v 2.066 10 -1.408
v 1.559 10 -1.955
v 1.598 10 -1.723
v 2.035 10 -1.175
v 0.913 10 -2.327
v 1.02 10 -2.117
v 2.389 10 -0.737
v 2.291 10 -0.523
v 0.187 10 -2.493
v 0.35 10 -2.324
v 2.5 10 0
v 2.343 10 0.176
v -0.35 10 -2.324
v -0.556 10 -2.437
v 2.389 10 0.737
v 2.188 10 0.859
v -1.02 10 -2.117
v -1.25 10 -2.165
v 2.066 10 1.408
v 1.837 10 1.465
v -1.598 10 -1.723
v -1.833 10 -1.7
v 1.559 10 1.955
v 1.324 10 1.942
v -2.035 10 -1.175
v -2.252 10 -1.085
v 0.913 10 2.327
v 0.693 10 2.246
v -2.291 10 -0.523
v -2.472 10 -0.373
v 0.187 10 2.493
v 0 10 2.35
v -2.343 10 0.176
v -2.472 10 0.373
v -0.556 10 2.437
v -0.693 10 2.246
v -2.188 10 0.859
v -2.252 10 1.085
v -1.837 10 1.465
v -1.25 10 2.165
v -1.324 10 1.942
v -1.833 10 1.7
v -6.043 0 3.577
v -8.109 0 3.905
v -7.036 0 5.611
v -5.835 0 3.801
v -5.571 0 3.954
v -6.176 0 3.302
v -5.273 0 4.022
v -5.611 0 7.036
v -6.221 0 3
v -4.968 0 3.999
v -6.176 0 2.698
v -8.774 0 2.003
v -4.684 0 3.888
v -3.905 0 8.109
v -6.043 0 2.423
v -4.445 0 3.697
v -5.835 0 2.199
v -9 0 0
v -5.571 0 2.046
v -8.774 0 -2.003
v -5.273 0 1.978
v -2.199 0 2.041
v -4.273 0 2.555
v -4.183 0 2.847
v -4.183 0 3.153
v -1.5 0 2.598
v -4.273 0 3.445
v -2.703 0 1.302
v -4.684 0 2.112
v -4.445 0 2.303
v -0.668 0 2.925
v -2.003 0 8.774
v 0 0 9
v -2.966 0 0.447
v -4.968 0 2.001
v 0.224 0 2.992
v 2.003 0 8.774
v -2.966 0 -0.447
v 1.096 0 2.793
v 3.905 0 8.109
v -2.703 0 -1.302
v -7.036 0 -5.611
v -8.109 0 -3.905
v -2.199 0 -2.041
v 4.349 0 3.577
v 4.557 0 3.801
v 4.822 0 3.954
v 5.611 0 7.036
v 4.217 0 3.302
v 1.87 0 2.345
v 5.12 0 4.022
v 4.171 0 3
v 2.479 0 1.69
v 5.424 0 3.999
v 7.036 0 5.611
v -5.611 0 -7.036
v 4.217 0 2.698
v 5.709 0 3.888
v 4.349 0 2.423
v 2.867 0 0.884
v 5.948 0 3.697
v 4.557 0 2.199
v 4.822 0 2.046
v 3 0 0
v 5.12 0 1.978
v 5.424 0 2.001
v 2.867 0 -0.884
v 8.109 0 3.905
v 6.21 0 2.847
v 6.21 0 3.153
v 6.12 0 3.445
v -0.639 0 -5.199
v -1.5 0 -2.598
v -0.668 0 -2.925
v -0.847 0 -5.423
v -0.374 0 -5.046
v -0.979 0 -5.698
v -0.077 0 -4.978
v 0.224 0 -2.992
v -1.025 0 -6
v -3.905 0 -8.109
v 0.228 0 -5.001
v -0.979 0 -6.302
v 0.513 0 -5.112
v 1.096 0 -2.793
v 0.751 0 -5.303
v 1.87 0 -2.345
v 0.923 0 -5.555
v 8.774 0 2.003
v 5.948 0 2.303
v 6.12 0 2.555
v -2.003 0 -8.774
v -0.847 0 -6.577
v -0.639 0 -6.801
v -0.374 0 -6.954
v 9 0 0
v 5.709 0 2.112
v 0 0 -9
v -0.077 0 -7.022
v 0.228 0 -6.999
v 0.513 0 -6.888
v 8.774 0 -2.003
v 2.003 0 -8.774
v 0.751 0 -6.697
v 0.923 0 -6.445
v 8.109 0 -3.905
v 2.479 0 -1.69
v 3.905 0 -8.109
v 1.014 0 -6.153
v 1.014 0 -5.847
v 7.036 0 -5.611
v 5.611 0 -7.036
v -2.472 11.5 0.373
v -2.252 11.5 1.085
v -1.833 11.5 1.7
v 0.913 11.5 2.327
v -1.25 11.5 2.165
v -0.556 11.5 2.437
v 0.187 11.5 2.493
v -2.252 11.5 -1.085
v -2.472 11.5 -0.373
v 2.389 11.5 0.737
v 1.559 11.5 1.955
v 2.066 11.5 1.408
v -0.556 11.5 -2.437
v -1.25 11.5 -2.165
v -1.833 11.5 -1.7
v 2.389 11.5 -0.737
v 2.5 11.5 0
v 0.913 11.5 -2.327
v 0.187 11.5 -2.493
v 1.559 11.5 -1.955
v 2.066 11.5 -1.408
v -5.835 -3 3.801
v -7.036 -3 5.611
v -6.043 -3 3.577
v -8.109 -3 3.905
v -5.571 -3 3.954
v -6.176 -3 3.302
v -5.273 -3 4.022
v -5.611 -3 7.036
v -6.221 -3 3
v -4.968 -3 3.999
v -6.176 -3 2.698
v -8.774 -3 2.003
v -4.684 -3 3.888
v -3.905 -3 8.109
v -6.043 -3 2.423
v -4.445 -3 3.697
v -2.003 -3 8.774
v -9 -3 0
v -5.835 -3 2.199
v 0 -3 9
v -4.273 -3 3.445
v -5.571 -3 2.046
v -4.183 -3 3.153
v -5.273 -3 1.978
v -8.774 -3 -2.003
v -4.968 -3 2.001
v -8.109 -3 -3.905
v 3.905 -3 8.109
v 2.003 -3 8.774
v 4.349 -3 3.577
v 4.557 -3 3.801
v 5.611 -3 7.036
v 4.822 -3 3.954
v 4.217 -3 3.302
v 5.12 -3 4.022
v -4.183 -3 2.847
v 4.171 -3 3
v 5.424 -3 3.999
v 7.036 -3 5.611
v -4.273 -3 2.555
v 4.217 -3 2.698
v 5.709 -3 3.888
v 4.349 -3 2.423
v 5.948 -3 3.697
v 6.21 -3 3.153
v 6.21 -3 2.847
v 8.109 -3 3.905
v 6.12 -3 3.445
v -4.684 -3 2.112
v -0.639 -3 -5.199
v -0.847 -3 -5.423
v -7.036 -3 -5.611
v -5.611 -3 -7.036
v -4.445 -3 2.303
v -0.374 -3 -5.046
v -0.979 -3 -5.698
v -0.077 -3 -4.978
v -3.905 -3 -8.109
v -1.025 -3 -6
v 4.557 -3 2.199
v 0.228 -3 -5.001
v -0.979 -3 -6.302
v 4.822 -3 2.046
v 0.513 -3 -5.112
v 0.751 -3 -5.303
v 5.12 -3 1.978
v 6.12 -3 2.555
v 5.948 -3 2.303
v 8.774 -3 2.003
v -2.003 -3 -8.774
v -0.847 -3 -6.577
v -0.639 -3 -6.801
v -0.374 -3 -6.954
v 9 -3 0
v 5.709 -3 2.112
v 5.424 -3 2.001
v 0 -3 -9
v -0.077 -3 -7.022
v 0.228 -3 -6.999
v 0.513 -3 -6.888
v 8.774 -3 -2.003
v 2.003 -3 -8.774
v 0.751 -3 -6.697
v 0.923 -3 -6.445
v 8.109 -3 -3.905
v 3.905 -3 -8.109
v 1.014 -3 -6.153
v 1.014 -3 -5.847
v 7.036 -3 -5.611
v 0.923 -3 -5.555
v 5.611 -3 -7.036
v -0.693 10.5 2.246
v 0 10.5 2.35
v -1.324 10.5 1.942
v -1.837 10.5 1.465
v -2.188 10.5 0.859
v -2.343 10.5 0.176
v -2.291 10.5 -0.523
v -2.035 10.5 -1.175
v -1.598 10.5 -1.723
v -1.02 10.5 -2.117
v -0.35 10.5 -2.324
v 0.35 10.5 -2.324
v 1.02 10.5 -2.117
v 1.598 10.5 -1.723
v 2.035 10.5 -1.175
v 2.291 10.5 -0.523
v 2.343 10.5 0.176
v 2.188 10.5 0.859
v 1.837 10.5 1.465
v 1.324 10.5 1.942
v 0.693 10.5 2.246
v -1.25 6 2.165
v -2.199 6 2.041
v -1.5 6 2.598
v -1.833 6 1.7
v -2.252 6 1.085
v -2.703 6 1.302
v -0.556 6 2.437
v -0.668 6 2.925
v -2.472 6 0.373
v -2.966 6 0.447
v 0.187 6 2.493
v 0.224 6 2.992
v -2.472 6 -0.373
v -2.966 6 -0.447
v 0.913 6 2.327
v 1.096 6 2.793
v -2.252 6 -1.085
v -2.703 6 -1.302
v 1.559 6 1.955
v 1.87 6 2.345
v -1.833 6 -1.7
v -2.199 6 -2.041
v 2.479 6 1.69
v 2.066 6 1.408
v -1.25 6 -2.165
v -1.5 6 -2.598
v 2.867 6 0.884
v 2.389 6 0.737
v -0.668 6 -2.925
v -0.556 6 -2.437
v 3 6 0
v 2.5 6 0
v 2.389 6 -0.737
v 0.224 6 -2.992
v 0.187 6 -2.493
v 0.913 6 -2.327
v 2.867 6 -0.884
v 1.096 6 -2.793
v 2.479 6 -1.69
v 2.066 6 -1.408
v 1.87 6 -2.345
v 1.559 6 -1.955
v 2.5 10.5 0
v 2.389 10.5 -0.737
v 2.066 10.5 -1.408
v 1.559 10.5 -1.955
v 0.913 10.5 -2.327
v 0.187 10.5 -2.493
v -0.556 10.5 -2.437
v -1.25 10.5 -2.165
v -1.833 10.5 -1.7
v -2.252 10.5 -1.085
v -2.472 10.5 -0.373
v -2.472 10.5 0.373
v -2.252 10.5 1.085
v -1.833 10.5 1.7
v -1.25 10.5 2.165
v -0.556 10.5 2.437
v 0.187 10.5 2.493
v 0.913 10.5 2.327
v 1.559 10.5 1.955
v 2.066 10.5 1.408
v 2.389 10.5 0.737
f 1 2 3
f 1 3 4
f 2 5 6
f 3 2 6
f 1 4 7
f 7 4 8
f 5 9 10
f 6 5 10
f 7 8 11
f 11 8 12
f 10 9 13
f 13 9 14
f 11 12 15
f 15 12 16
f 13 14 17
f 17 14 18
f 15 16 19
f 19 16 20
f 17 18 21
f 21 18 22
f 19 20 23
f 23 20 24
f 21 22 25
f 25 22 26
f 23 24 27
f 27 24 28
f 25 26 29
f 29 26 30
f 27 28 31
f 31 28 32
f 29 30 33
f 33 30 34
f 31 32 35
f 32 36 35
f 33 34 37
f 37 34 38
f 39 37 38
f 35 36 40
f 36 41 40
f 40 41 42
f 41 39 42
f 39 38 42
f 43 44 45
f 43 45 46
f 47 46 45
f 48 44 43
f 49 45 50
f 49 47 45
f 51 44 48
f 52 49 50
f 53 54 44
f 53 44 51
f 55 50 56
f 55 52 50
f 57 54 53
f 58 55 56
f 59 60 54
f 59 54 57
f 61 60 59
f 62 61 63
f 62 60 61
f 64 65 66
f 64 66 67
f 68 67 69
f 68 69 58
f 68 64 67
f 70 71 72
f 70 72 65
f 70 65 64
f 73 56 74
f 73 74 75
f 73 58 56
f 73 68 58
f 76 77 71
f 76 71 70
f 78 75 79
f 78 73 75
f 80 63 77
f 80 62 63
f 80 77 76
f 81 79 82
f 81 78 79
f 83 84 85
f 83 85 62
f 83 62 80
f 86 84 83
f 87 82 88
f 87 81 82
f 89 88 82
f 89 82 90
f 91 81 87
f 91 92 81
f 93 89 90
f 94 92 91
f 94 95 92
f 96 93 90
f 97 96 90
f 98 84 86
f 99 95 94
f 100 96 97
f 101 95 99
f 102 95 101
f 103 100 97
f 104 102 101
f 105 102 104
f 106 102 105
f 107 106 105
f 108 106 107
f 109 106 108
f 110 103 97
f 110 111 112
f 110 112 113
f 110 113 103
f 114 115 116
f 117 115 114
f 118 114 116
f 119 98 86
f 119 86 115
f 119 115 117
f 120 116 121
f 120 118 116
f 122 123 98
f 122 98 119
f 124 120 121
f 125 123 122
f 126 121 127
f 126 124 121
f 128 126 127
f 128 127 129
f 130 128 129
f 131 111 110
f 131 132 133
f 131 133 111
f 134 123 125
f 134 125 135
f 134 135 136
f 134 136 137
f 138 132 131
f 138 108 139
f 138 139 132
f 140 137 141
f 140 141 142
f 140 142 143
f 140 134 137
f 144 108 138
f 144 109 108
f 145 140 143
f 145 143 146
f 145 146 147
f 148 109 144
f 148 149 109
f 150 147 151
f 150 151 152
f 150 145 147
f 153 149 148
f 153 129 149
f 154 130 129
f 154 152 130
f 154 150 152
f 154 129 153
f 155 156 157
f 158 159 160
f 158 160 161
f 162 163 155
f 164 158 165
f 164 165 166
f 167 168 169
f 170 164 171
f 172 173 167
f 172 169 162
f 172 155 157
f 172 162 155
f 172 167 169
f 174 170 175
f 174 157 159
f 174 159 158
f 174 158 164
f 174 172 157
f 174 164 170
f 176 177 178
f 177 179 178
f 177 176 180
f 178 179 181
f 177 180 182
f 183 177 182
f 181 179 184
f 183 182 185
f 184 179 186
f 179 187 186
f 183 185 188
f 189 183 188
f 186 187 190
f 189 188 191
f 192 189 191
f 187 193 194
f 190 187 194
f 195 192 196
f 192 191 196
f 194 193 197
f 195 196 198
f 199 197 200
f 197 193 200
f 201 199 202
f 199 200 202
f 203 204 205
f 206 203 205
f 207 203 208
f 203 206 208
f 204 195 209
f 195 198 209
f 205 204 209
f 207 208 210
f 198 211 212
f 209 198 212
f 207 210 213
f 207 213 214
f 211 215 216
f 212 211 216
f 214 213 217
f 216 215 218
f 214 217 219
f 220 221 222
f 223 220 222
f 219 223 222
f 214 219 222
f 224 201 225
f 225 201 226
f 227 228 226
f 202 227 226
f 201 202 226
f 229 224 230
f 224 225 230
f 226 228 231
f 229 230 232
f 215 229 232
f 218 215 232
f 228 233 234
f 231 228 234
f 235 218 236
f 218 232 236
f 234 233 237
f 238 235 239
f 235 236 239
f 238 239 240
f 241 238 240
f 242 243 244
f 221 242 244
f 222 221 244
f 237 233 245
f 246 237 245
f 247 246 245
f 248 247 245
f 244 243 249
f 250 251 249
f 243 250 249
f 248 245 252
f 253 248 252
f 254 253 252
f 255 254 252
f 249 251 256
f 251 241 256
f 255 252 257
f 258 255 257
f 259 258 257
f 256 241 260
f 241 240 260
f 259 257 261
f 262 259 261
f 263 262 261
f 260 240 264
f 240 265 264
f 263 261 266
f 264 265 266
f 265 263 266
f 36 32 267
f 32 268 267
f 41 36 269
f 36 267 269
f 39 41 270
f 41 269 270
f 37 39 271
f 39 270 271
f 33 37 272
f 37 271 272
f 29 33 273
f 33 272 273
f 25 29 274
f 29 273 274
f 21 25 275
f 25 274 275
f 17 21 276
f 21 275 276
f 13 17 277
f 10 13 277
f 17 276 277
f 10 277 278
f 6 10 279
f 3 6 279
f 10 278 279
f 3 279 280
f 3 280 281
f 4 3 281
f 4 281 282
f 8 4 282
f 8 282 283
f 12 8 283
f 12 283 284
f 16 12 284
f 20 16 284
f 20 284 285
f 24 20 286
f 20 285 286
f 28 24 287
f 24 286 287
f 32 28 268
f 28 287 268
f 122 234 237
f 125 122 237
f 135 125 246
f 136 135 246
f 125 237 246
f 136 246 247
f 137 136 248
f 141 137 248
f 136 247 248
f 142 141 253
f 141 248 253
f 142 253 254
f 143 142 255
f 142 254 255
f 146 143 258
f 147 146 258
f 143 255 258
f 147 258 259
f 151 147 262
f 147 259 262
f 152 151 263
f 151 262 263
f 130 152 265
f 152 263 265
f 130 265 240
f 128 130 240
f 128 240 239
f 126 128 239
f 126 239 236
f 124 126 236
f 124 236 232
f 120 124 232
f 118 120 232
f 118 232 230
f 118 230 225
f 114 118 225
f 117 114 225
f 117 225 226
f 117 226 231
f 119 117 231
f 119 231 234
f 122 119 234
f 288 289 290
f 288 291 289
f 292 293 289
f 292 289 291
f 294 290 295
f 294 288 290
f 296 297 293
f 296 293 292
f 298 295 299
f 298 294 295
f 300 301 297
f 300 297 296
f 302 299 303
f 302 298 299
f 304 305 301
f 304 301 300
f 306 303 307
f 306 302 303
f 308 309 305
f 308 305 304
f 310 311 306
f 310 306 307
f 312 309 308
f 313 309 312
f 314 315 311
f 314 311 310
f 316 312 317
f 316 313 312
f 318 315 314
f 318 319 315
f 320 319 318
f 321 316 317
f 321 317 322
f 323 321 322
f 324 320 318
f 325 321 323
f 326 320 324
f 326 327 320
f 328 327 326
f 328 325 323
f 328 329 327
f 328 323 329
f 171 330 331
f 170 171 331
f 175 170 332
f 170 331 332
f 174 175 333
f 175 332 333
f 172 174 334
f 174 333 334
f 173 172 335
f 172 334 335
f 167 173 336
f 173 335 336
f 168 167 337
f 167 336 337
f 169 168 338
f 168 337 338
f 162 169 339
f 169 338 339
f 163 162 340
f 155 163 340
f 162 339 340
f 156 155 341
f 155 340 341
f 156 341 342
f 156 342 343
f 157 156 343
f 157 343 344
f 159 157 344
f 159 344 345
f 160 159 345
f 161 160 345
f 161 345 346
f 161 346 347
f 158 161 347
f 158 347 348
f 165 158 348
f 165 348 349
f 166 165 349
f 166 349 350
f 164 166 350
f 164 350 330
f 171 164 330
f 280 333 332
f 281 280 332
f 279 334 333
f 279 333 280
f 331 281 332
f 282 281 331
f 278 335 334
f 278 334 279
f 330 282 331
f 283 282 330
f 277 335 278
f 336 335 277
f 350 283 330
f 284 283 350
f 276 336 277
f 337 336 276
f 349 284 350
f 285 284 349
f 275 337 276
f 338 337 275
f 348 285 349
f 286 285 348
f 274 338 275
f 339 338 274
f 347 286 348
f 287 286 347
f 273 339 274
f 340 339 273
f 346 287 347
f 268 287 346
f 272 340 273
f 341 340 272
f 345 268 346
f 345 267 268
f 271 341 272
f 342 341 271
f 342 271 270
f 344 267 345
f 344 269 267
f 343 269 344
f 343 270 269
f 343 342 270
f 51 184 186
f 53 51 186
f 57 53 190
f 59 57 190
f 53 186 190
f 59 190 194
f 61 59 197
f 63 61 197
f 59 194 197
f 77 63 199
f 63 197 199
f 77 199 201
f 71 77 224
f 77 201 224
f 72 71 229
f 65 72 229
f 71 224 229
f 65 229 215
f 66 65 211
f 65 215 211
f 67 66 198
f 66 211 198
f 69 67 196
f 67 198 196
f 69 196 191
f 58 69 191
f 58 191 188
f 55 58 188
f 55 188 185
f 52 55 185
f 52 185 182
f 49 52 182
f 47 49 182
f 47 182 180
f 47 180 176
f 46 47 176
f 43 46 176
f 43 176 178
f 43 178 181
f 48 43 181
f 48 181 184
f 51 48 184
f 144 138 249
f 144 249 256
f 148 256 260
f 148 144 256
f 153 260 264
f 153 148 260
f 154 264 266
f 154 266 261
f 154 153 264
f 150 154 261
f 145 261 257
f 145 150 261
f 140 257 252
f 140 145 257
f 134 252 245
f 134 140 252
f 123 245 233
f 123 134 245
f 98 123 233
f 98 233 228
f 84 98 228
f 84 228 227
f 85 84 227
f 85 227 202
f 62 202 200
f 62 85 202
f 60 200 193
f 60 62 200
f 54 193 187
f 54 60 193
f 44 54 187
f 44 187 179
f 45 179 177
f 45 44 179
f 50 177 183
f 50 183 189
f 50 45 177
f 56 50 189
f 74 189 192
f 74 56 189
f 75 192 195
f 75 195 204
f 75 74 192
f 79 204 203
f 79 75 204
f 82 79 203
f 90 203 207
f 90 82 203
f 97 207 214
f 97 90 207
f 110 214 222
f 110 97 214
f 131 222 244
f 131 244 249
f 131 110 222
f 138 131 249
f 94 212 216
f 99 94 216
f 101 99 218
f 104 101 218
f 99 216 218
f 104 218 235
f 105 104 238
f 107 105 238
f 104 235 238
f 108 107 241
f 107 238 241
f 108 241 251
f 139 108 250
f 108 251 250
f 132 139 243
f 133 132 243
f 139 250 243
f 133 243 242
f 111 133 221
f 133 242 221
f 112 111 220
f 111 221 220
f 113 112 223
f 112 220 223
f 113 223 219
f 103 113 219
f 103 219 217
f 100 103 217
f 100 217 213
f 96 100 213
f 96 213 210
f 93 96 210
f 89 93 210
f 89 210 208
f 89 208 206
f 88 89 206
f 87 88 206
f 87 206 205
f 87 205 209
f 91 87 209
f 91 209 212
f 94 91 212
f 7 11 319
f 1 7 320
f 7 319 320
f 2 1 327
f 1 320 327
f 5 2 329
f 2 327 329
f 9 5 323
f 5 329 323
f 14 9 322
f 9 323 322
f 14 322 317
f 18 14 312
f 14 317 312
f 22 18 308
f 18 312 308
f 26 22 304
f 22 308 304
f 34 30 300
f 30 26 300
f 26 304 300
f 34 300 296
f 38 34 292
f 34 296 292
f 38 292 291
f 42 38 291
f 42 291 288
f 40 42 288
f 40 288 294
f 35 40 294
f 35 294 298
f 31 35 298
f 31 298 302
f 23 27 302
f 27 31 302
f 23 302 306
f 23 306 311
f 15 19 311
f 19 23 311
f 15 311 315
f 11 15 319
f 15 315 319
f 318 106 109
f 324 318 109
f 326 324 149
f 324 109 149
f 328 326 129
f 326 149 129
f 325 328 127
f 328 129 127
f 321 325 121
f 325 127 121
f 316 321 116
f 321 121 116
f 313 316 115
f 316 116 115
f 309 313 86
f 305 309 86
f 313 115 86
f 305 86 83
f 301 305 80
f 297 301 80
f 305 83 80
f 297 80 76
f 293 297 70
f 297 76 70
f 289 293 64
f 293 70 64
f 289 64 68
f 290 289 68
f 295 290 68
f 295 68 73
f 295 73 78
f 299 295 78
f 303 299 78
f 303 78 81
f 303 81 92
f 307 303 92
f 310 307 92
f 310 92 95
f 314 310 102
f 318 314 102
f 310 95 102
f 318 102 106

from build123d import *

# Parameters (mm, degrees)
SKETCH_1_R           = 3
SKETCH_1_R_2         = 2.5
EXTRUDE_1_DEPTH      = 6
SKETCH_1_8_R         = 2.5
EXTRUDE_2_DEPTH      = 11.5
SKETCH_1_9_R         = 9
EXTRUDE_3_DEPTH      = 3
SKETCH_6_W           = 0.15
SKETCH_6_H           = 0.5
HOLE_WIZARD_M2_5_1_D = 2.05


with BuildPart() as part:
    # 草图1 → 凸台-拉伸1 (new body)
    with BuildSketch(Plane(origin=(0, 0, 0), x_dir=(1, 0, 0), z_dir=(0, 1, 0))):
        Circle(SKETCH_1_R)
        Circle(SKETCH_1_R_2, mode=Mode.SUBTRACT)
    extrude(amount=EXTRUDE_1_DEPTH)

    # 草图1<8> → 凸台-拉伸2 (add)
    with BuildSketch(Plane(origin=(0, 0, 0), x_dir=(1, 0, 0), z_dir=(0, 1, 0))):
        Circle(SKETCH_1_8_R)
    extrude(amount=EXTRUDE_2_DEPTH)

    # 草图1<9> → 凸台-拉伸3 (add)
    with BuildSketch(Plane(origin=(0, 0, 0), x_dir=(1, 0, 0), z_dir=(0, 1, 0))):
        Circle(SKETCH_1_9_R)
    extrude(amount=-EXTRUDE_3_DEPTH)

    # 草图6 → 切除-旋转1 (revolve, cut)
    with BuildSketch(Plane(origin=(0, 0, 0), x_dir=(0, 0, -1), z_dir=(1, 0, 0))):
        with Locations((-2.425, 10.25)):
            Rectangle(SKETCH_6_W, SKETCH_6_H)
    revolve(axis=Axis((0, 9, 0), (0, -1, 0)), mode=Mode.SUBTRACT)

    # M2.5 螺纹孔1 (through all)
    with Locations(Plane(origin=(0, 0, 0), x_dir=(1, 0, 0), z_dir=(0, 1, 0))):
        with Locations((-5.196152423, -3), (0, 6), (5.196152423, -3)):
            Hole(HOLE_WIZARD_M2_5_1_D / 2)


solid = part.part
